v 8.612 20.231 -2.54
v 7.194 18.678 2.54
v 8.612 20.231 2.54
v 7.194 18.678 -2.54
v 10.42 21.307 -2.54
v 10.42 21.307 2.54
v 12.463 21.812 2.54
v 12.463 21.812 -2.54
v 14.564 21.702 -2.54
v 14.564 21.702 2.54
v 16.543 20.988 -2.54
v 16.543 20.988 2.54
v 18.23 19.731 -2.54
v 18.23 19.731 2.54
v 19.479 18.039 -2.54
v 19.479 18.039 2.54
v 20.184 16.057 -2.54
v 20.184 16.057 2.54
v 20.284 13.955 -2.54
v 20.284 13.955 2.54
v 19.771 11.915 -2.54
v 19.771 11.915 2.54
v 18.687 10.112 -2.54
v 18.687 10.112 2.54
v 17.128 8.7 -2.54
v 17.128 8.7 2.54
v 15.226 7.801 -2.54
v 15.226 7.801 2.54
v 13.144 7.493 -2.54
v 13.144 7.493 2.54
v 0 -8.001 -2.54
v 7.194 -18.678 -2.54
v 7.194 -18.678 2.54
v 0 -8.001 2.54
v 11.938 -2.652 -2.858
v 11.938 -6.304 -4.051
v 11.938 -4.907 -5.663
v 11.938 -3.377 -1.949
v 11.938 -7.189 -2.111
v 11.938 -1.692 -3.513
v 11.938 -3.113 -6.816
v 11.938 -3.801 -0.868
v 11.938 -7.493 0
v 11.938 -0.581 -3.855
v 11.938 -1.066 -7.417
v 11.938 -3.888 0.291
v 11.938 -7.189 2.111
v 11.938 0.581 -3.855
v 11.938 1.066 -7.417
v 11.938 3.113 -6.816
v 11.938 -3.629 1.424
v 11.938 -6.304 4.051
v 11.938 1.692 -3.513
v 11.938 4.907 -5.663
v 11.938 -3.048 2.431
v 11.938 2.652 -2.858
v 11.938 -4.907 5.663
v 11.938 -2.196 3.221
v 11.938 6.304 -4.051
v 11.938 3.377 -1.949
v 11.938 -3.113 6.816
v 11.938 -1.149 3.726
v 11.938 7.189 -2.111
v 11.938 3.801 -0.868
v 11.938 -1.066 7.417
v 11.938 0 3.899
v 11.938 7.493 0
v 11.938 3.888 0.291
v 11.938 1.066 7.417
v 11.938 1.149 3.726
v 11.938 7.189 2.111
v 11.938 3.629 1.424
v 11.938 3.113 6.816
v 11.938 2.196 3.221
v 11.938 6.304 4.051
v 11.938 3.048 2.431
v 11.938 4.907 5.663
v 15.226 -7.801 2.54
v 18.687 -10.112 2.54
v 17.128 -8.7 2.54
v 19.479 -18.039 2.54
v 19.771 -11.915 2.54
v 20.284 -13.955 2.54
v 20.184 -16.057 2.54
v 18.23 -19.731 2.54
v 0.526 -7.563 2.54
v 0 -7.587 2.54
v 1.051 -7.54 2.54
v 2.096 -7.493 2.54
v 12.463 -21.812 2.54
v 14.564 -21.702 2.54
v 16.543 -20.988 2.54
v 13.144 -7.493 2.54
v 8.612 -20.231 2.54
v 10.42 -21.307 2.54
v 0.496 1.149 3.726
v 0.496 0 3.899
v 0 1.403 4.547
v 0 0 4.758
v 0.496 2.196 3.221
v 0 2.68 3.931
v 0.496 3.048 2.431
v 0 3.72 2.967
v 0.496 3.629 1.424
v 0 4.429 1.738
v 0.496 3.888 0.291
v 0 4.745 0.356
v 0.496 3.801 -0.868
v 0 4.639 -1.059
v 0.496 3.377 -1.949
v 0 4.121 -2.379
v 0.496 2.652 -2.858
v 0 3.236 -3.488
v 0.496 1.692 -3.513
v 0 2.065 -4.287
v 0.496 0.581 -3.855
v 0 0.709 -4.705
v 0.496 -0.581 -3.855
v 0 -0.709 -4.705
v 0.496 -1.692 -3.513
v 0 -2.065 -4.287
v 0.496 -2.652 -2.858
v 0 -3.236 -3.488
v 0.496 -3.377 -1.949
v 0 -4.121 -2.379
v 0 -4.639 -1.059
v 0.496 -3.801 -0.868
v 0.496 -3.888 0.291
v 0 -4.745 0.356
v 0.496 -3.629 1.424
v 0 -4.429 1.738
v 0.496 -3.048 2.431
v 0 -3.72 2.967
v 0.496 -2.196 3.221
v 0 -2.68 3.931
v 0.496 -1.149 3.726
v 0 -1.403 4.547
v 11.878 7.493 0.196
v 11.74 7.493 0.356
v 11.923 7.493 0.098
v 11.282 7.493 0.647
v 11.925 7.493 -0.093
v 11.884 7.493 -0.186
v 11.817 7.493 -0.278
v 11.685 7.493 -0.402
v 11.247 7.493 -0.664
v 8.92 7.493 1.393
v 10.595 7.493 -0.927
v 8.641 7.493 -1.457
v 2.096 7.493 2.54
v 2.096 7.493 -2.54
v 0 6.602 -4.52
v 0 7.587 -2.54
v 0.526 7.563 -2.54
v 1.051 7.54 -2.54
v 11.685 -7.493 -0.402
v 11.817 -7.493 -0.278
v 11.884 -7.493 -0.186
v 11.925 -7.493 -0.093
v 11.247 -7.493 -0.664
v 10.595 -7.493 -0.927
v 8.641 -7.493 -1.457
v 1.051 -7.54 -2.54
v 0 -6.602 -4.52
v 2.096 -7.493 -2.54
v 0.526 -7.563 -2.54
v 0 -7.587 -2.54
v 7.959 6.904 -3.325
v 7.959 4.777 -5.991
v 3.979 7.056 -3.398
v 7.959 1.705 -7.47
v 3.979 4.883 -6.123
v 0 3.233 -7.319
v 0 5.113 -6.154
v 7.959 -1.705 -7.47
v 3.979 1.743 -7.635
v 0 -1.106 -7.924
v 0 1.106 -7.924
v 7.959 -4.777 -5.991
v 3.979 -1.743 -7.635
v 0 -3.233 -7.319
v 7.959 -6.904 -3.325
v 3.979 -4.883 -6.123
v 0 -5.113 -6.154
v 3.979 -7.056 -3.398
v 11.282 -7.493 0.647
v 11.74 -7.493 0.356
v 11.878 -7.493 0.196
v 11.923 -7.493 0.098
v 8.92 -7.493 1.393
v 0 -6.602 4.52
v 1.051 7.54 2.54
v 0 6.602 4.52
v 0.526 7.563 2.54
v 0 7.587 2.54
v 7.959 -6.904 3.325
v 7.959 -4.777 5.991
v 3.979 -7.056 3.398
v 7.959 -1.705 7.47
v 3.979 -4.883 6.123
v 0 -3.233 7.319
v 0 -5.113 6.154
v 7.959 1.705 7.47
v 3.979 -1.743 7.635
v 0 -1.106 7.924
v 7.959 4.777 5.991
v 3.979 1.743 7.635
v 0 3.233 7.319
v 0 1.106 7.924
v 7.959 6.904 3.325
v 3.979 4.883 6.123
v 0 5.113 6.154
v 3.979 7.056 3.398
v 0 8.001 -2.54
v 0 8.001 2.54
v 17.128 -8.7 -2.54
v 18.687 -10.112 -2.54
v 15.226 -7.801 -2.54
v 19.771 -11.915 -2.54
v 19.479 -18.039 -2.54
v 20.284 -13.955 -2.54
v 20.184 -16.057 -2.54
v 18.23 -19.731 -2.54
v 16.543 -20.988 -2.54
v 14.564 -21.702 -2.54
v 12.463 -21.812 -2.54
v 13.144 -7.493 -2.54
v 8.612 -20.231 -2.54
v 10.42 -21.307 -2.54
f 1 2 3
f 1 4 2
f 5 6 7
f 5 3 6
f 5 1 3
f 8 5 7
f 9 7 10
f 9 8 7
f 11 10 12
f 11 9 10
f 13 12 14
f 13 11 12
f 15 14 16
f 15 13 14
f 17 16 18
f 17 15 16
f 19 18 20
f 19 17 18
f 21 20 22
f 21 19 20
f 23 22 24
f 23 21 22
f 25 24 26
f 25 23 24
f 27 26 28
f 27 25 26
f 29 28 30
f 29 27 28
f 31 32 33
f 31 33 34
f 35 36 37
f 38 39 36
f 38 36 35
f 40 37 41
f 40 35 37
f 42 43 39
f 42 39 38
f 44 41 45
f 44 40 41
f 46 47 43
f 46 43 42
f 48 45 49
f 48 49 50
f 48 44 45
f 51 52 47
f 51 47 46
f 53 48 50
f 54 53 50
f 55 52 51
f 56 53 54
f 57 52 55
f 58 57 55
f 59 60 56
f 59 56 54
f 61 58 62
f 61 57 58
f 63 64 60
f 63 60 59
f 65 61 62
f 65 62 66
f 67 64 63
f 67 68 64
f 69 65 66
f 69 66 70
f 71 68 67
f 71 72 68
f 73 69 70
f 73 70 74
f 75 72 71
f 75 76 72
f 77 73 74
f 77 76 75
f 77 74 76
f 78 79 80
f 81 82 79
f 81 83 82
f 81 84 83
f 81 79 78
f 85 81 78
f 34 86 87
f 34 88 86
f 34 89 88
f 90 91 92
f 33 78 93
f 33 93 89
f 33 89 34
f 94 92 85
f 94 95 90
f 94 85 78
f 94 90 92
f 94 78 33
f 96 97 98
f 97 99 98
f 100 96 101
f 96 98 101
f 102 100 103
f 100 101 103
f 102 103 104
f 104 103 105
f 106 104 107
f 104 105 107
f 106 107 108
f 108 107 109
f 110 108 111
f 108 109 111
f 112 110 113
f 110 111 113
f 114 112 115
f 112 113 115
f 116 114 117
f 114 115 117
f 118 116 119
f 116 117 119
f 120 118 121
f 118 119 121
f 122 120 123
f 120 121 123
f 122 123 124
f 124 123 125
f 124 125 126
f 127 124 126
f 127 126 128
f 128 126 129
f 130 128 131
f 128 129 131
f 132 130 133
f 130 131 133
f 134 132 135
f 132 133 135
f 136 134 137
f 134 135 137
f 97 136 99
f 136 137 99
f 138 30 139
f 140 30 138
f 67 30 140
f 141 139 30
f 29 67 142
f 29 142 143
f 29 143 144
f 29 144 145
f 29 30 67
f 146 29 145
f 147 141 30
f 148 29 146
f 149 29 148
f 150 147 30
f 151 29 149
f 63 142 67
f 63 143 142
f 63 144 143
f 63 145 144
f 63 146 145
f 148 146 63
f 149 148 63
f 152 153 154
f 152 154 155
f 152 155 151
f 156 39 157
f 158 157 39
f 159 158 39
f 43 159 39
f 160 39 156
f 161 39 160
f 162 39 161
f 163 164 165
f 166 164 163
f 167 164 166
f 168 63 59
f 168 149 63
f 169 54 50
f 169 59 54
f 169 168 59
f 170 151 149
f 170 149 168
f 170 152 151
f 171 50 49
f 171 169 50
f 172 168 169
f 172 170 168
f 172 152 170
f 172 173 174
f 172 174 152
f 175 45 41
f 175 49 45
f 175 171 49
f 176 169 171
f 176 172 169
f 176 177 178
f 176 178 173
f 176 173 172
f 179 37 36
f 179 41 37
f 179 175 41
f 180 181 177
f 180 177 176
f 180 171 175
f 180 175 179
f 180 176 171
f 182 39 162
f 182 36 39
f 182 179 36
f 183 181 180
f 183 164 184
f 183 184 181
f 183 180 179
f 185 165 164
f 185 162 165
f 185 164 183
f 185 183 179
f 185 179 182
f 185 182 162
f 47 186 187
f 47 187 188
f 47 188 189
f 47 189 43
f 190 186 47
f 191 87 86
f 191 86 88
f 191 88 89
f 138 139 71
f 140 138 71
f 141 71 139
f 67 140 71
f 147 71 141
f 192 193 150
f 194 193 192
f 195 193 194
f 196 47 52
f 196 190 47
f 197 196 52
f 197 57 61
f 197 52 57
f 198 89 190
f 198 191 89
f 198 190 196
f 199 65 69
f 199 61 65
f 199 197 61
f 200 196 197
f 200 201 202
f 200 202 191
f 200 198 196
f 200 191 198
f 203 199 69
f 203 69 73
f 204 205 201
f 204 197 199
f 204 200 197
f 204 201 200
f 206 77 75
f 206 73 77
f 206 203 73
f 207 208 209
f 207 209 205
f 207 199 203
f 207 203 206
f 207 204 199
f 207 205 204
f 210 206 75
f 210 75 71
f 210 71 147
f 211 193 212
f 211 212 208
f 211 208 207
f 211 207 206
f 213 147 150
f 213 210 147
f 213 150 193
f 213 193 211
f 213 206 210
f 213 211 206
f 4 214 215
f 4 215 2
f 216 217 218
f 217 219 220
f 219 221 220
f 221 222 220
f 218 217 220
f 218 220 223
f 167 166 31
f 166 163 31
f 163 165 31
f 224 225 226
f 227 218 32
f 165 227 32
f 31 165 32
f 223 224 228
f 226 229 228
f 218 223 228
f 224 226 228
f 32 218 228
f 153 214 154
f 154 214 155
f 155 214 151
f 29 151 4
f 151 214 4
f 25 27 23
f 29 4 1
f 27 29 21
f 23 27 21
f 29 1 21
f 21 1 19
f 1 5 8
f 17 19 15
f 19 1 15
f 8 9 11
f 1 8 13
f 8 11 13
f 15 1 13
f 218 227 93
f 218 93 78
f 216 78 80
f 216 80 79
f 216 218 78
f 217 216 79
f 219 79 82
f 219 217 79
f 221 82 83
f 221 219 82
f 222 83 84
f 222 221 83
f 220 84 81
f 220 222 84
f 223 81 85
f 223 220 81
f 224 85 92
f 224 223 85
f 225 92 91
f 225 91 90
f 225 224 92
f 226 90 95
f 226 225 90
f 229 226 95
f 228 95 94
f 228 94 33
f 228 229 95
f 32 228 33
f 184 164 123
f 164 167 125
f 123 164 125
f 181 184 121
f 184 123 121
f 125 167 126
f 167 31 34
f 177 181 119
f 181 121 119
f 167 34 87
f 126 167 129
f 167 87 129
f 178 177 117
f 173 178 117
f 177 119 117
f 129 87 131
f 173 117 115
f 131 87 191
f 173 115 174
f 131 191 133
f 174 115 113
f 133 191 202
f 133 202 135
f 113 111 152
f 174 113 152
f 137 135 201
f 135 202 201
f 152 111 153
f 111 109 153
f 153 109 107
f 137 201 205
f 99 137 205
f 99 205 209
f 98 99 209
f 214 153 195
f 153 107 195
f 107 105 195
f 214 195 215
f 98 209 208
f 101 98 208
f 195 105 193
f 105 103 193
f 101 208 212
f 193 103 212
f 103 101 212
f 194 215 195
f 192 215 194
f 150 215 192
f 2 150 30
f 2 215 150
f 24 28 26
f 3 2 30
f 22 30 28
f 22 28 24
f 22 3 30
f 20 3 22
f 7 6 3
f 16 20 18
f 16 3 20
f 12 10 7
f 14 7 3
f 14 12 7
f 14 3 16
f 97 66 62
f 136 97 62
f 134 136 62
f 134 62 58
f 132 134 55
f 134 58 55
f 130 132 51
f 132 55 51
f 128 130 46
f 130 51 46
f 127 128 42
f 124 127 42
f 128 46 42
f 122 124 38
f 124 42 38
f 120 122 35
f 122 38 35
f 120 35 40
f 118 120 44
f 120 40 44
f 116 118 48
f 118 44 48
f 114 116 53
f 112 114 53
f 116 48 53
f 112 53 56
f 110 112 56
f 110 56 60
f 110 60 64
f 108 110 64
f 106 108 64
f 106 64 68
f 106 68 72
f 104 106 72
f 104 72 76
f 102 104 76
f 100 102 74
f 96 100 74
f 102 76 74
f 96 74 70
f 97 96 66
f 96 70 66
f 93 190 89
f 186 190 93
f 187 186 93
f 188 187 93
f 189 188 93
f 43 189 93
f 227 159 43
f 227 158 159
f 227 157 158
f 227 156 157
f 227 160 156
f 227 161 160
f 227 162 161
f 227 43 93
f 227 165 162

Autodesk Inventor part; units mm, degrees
ref_plane "YZ Plane" through (0, 0, 0) normal (1, 0, 0) x (0, 1, 0)
ref_plane "XZ Plane" through (0, 0, 0) normal (0, 1, 0) x (-1, 0, 0)
sketch "Sketch1" plane through (0, 0, 0) normal (0, 0, 1) x (1, 0, 0)
  line L0 (0, 0) -> (11.938, 0)
  line L1 (0, 0) -> (0, 8.001)
  line L2 (11.938, 7.493) -> (11.938, 0)
  line L3 (0, 8.001) -> (7.1937, 18.6779)
  line L4 (11.938, 7.493) -> (13.1445, 7.493)
  arc A0 (13.1445, 7.493) -> (7.1937, 18.6779) centre (13.1445, 14.6685) ccw
  line L5 (11.938, 7.493) -> (0, 8.001)
  line L6 (11.938, 7.493) -> (0, 7.493)
  dimension "d0" = 14.986
  dimension "d1" = 13.1445
  dimension "d2" = 14.6685
  dimension "d3" = 7.1755
  dimension "d4" = 11.938
  dimension "d5" = 16.002
revolve "Body" add sketch "Sketch1" angle 360 about axis through (0, 0, 0) along (1, 0, 0) contours L1 L6 L2 L0 | L1 L5 L6
extrude "Wing1" add sketch "Sketch1" along normal mid plane 5.08 contours L1 L5 L6 | L5 L3 A0 L4
fillet "Fillet1" [suppressed]
mirror "Wing2" about plane through (0, 0, 0) normal (0, 1, 0) of "Wing1"
sketch "Sketch2" plane through (0, 0, 0) normal (1, 0, 0) x (0, 1, 0)
  line L0 (0, -14) -> (0, 14) projected
  line L1 (-14, 0) -> (14, 0) projected
  point P0 (0, 0)
hole "Thread" at (0, 0, 0) direction (1, 0, 0) diameter 7.7978 end through all thread size "3/8-16 UNC" class "2B" standard "ANSI Unified Screw Threads"
chamfer "Chamfer1" distance 0.8593 angle 30 1 edges at (0, 0, -3.8989) measured on face at (0, 6.3482, -0.1567)
ref_plane "Work Plane1" through (50.7701, 0, 0) normal (0, 0, -1) x (1, 0, 0)
equation "\"d0\" = KOD2"
equation "\"d1\" = KOH1 - RR"
equation "\"d2\" = 0.5 * E0 - RR"
equation "\"d3\" = RR"
equation "\"d4\" = KOH"
equation "\"d5\" = KOD"
equation "\"d6\" = SW"
equation "\"d8\" = 0.333333 * SW"
equation "\"d9\" = -0.5 * GD1 + 0.5 * NND"
equation "\"d109\" = -0.5 * GD1 + 0.5 * NND"
equation "\"NND\" = 9.525"
equation "\"KOH\" = 11.938"
equation "\"KOH1\" = 20.32"
equation "\"SW\" = 5.08"
equation "\"KOD\" = 16.002"
equation "\"KOD2\" = 14.986"
equation "\"RR\" = 7.1755"
equation "\"E0\" = 43.688"
equation "\"THREADDIA\" = 9.525"
equation "\"TOA\" = 30deg"
equation "\"RR2\" = 2.8702"
equation "\"SW1\" = SW"
equation "\"GD1\" = 7.806481"
properties part number "ANSI B18.17 - 3/8 - 16" material "Steel, Mild"
